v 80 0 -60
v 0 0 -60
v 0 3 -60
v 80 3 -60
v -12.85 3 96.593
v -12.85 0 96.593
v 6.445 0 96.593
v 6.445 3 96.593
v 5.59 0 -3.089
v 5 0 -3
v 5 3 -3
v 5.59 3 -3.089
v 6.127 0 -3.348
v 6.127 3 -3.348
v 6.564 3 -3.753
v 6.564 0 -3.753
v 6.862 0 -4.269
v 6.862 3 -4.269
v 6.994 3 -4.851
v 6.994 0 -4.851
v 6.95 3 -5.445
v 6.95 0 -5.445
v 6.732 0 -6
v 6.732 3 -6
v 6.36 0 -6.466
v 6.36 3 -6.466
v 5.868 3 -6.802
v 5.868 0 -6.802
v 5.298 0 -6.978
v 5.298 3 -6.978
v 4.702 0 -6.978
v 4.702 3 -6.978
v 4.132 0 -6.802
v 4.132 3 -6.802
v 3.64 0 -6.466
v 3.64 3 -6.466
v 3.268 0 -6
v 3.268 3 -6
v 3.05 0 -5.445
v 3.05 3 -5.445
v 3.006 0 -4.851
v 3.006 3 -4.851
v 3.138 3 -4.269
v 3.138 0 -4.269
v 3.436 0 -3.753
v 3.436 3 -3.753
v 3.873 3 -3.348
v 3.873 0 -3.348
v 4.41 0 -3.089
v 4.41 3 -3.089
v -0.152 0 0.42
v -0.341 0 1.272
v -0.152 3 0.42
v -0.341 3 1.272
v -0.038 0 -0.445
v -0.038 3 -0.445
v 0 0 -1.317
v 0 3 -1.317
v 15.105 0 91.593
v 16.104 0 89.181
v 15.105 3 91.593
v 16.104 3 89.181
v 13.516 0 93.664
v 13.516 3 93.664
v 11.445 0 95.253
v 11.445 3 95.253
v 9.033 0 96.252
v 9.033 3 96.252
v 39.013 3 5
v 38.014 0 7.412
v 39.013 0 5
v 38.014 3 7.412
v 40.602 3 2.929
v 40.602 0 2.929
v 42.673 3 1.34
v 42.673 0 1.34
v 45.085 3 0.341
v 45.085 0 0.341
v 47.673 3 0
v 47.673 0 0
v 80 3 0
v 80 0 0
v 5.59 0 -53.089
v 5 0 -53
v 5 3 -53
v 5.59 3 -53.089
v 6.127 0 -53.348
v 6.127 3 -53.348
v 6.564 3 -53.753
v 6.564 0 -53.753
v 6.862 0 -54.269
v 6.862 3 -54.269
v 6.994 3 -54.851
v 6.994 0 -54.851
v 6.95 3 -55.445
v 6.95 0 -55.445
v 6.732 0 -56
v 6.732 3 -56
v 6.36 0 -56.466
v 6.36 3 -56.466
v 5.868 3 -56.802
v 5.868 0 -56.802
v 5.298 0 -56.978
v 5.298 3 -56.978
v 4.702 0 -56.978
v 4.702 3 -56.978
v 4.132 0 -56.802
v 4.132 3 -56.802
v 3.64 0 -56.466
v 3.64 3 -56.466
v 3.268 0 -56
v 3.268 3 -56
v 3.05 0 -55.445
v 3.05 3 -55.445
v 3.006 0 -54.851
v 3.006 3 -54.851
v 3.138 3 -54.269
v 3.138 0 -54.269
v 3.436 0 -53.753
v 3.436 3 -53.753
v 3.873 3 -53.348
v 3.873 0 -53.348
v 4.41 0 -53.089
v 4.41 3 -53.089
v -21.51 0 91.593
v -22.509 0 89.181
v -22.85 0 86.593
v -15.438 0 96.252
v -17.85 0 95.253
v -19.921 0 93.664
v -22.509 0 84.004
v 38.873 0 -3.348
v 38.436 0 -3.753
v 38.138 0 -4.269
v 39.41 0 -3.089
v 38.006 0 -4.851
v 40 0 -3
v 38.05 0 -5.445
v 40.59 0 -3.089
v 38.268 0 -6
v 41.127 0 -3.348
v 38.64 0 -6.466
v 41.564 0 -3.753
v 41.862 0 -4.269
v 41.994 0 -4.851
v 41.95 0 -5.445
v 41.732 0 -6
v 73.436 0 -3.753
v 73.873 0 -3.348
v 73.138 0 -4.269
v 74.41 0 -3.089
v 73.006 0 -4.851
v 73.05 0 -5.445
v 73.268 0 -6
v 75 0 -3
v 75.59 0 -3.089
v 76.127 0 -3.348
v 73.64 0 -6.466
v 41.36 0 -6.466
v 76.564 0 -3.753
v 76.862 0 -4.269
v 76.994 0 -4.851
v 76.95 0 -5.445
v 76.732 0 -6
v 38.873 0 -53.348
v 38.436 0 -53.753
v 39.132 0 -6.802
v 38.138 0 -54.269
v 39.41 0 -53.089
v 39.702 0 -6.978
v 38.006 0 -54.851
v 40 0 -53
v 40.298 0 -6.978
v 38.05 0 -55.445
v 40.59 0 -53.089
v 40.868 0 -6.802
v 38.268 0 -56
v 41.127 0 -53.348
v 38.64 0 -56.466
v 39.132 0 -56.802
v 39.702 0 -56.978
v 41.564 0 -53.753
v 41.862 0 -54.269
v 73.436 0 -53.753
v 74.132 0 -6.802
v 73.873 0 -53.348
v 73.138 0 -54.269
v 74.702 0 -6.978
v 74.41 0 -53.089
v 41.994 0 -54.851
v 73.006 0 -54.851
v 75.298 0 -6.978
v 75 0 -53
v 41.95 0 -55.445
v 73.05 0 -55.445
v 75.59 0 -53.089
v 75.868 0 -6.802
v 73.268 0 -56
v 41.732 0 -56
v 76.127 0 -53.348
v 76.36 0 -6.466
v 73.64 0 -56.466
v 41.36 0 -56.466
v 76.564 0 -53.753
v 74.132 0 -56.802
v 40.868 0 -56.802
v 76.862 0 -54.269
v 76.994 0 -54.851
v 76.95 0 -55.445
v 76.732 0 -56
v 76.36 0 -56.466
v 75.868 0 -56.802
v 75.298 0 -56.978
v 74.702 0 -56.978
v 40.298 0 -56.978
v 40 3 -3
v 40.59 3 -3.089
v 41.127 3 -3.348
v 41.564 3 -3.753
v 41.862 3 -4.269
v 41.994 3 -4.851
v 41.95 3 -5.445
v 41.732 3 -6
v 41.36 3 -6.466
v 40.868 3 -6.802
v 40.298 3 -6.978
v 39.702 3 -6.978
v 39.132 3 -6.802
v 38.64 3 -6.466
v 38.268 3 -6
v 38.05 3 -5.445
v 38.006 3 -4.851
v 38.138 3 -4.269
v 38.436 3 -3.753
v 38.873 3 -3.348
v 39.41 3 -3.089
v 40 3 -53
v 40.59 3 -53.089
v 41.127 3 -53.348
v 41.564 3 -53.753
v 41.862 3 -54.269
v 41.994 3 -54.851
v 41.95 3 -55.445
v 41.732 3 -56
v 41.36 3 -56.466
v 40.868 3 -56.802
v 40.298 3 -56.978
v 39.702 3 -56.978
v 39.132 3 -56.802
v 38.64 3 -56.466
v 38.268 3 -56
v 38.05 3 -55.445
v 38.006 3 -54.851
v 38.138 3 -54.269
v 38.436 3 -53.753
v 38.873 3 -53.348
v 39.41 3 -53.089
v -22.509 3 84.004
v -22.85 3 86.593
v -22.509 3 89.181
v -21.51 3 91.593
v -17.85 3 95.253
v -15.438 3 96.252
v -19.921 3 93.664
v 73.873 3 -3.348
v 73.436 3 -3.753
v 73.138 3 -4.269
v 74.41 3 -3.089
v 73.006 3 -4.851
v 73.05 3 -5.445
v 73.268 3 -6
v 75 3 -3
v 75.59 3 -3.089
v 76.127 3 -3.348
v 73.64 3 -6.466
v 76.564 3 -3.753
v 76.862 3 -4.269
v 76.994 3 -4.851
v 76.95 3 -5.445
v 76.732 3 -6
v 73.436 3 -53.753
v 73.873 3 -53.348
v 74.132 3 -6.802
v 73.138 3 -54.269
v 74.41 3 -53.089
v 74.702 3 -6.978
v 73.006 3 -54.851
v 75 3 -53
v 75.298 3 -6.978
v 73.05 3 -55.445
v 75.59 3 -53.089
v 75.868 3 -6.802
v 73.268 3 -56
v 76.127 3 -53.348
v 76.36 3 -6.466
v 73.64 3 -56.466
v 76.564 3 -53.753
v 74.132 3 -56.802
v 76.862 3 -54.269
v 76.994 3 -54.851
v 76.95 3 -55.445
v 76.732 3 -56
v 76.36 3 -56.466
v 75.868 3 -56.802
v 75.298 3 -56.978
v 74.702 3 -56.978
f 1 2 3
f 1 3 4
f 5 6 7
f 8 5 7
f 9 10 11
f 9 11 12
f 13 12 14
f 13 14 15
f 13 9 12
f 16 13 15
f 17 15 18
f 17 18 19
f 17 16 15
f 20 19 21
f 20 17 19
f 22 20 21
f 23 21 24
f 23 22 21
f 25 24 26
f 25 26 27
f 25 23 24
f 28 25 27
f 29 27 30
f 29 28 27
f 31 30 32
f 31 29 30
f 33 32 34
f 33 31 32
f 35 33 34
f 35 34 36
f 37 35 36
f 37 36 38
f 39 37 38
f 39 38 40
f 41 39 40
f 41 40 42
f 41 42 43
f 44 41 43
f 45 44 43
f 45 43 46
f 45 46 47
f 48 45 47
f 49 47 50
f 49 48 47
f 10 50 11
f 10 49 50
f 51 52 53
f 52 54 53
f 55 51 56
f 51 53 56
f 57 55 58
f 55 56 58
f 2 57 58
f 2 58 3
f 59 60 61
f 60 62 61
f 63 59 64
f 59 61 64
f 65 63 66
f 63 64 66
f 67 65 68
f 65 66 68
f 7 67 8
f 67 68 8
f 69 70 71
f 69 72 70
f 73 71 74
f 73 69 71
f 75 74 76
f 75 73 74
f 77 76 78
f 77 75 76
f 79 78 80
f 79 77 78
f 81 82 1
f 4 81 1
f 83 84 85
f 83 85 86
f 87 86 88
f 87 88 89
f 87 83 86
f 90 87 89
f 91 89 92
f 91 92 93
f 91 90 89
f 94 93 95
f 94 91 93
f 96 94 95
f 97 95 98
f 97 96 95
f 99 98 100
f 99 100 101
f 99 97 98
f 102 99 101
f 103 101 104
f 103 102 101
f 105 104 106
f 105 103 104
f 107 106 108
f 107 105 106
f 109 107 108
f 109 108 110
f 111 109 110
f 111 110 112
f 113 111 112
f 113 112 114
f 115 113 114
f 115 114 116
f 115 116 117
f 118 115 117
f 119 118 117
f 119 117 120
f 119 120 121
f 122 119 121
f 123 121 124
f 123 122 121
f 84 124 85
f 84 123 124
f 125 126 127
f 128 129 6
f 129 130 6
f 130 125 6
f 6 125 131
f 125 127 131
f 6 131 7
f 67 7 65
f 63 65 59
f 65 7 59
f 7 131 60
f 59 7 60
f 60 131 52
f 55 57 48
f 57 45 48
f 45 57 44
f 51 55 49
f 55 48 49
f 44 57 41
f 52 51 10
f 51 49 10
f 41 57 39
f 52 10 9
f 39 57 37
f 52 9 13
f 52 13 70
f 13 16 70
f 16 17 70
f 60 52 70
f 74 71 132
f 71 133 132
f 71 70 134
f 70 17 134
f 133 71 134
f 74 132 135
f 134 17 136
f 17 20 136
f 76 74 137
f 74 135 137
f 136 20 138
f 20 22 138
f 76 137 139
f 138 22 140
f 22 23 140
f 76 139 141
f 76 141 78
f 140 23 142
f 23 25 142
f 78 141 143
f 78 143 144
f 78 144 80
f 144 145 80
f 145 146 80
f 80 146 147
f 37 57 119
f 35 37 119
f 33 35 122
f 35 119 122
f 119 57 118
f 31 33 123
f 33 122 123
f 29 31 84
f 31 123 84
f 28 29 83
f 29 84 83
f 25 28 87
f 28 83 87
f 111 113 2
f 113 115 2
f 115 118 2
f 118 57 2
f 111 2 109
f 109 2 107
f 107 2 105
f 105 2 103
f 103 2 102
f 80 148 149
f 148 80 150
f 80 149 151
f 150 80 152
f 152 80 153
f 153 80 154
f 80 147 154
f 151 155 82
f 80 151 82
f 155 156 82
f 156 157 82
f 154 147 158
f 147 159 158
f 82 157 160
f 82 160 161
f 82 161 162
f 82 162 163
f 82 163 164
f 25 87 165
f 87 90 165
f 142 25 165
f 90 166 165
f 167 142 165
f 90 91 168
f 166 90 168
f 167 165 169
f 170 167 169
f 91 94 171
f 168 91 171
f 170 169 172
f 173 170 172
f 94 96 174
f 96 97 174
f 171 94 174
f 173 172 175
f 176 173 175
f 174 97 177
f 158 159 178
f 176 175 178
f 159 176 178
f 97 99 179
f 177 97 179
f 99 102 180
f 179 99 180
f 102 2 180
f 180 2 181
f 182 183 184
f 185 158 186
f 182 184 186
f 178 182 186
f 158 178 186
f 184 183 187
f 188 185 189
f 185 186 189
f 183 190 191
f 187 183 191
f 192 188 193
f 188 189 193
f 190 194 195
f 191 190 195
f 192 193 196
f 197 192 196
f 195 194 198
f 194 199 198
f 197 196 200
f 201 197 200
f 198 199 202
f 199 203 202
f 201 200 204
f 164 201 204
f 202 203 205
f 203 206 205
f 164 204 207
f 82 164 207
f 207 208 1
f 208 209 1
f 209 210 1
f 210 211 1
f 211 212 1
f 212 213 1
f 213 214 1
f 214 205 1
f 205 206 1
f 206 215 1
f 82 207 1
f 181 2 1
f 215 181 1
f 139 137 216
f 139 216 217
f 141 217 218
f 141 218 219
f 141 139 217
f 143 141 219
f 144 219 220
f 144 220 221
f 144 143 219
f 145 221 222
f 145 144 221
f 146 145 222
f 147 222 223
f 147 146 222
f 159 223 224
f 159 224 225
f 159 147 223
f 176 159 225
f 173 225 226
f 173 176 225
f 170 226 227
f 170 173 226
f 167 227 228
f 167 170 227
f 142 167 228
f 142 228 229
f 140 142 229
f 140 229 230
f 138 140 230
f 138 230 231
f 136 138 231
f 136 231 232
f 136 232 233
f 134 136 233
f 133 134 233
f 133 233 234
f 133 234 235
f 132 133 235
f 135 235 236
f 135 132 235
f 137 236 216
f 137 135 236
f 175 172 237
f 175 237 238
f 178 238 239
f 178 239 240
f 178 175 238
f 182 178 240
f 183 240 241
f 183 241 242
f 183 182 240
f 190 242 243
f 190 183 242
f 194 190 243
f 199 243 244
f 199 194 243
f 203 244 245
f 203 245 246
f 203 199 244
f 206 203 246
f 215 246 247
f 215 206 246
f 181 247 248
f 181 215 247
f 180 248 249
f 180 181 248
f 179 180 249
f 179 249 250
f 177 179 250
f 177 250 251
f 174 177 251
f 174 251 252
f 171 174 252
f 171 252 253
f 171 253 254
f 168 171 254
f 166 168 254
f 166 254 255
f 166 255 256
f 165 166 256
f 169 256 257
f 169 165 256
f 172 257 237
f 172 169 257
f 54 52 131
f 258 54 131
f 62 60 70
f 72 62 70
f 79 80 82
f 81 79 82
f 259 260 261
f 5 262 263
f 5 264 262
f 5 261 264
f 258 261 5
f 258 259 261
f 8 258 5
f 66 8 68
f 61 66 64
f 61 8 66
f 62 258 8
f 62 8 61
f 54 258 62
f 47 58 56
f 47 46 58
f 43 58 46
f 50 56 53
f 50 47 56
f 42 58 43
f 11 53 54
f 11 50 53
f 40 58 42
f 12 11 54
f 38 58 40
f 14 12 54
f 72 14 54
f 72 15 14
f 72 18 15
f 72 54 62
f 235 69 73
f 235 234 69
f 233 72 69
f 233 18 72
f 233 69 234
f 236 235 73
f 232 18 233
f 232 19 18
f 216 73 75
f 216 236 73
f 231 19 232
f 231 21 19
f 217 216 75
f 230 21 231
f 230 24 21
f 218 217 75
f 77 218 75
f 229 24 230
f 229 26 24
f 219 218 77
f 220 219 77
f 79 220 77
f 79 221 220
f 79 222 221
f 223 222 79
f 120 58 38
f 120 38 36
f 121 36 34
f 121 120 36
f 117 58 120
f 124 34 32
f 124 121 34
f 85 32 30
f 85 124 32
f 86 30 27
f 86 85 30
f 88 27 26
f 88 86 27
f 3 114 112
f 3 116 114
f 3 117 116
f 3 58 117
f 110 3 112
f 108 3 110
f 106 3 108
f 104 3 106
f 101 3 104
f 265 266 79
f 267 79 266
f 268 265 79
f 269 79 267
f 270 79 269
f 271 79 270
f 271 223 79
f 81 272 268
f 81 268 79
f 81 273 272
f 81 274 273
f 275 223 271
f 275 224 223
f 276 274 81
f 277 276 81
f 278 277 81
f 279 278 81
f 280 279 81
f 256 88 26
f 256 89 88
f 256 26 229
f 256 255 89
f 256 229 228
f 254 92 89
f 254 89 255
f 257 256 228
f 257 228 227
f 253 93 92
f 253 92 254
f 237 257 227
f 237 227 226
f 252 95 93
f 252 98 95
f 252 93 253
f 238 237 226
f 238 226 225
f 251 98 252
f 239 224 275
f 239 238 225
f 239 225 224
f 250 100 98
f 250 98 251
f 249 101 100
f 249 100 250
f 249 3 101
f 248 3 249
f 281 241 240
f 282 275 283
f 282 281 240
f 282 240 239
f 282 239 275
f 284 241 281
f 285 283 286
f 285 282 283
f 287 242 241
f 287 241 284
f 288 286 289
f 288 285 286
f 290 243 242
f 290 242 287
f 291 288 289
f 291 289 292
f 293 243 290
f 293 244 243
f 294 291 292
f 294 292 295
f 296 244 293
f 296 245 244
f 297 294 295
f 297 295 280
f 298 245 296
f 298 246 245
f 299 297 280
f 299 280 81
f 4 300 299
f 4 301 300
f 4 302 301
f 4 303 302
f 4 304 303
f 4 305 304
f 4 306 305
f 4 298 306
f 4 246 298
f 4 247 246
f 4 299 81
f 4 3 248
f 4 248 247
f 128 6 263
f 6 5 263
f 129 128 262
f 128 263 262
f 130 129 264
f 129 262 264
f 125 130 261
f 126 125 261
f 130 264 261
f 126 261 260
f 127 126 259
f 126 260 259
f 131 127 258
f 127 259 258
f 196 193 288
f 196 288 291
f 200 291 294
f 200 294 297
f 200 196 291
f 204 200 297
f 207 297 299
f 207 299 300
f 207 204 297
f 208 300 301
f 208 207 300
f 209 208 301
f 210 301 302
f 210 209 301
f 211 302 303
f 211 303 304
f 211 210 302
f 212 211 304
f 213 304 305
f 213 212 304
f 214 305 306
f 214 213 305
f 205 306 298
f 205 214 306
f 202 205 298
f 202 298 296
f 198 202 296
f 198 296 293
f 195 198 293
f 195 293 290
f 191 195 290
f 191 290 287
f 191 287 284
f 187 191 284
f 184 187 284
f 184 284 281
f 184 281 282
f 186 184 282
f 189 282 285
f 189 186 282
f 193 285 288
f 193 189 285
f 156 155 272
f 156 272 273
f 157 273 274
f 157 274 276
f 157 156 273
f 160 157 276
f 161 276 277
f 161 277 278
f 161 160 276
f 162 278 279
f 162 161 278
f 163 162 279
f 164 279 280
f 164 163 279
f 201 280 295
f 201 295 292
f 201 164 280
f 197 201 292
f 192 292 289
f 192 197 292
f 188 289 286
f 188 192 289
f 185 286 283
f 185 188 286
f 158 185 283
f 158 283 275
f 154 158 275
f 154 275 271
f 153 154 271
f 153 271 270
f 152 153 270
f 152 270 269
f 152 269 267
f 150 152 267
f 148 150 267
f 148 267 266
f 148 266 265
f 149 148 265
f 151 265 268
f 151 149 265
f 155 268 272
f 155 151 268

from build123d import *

# Parameters (mm, degrees)
SKETCH1_W           = 80
SKETCH1_H           = 60
SKETCH1_R           = 2
BOSS_EXTRUDE1_DEPTH = 3
FILLET1_R           = 10


with BuildPart() as part:
    # Sketch1 → Boss-Extrude1 (new body)
    # profile 1 of 2: a face of its own
    with BuildSketch(Plane(origin=(0, 0, 0), x_dir=(1, 0, 0), z_dir=(0, 1, 0))):
        with Locations((40, 30)):
            Rectangle(SKETCH1_W, SKETCH1_H)
        with Locations(Location((40, 5, 0), (0, 0, 270))):
            Circle(SKETCH1_R, mode=Mode.SUBTRACT)
        with Locations(Location((40, 55, 0), (0, 0, 270))):
            Circle(SKETCH1_R, mode=Mode.SUBTRACT)
        with Locations(Location((5, 5, 0), (0, 0, 270))):
            Circle(SKETCH1_R, mode=Mode.SUBTRACT)
        with Locations(Location((75, 5, 0), (0, 0, 270))):
            Circle(SKETCH1_R, mode=Mode.SUBTRACT)
        with Locations(Location((75, 55, 0), (0, 0, 270))):
            Circle(SKETCH1_R, mode=Mode.SUBTRACT)
        with Locations(Location((5, 55, 0), (0, 0, 270))):
            Circle(SKETCH1_R, mode=Mode.SUBTRACT)
    # profile 2 of 2: a face of its own
    with BuildSketch(Plane(origin=(0, 0, 0), x_dir=(1, 0, 0), z_dir=(0, 1, 0))):
        Polygon((14.11809549, -96.592582629), (40, 0), (0, 0), (-25.88190451, -96.592582629), align=None)
    extrude(amount=BOSS_EXTRUDE1_DEPTH)

    # Fillet1
    fillet1_edges = [part.edges().sort_by_distance(p)[0] for p in [
        (40, 1.5, 0),
        (14.11809549, 1.5, 96.592582629),
        (-25.88190451, 1.5, 96.592582629),
        (0, 1.5, 0),
    ]]
    fillet(fillet1_edges, radius=FILLET1_R)


solid = part.part
